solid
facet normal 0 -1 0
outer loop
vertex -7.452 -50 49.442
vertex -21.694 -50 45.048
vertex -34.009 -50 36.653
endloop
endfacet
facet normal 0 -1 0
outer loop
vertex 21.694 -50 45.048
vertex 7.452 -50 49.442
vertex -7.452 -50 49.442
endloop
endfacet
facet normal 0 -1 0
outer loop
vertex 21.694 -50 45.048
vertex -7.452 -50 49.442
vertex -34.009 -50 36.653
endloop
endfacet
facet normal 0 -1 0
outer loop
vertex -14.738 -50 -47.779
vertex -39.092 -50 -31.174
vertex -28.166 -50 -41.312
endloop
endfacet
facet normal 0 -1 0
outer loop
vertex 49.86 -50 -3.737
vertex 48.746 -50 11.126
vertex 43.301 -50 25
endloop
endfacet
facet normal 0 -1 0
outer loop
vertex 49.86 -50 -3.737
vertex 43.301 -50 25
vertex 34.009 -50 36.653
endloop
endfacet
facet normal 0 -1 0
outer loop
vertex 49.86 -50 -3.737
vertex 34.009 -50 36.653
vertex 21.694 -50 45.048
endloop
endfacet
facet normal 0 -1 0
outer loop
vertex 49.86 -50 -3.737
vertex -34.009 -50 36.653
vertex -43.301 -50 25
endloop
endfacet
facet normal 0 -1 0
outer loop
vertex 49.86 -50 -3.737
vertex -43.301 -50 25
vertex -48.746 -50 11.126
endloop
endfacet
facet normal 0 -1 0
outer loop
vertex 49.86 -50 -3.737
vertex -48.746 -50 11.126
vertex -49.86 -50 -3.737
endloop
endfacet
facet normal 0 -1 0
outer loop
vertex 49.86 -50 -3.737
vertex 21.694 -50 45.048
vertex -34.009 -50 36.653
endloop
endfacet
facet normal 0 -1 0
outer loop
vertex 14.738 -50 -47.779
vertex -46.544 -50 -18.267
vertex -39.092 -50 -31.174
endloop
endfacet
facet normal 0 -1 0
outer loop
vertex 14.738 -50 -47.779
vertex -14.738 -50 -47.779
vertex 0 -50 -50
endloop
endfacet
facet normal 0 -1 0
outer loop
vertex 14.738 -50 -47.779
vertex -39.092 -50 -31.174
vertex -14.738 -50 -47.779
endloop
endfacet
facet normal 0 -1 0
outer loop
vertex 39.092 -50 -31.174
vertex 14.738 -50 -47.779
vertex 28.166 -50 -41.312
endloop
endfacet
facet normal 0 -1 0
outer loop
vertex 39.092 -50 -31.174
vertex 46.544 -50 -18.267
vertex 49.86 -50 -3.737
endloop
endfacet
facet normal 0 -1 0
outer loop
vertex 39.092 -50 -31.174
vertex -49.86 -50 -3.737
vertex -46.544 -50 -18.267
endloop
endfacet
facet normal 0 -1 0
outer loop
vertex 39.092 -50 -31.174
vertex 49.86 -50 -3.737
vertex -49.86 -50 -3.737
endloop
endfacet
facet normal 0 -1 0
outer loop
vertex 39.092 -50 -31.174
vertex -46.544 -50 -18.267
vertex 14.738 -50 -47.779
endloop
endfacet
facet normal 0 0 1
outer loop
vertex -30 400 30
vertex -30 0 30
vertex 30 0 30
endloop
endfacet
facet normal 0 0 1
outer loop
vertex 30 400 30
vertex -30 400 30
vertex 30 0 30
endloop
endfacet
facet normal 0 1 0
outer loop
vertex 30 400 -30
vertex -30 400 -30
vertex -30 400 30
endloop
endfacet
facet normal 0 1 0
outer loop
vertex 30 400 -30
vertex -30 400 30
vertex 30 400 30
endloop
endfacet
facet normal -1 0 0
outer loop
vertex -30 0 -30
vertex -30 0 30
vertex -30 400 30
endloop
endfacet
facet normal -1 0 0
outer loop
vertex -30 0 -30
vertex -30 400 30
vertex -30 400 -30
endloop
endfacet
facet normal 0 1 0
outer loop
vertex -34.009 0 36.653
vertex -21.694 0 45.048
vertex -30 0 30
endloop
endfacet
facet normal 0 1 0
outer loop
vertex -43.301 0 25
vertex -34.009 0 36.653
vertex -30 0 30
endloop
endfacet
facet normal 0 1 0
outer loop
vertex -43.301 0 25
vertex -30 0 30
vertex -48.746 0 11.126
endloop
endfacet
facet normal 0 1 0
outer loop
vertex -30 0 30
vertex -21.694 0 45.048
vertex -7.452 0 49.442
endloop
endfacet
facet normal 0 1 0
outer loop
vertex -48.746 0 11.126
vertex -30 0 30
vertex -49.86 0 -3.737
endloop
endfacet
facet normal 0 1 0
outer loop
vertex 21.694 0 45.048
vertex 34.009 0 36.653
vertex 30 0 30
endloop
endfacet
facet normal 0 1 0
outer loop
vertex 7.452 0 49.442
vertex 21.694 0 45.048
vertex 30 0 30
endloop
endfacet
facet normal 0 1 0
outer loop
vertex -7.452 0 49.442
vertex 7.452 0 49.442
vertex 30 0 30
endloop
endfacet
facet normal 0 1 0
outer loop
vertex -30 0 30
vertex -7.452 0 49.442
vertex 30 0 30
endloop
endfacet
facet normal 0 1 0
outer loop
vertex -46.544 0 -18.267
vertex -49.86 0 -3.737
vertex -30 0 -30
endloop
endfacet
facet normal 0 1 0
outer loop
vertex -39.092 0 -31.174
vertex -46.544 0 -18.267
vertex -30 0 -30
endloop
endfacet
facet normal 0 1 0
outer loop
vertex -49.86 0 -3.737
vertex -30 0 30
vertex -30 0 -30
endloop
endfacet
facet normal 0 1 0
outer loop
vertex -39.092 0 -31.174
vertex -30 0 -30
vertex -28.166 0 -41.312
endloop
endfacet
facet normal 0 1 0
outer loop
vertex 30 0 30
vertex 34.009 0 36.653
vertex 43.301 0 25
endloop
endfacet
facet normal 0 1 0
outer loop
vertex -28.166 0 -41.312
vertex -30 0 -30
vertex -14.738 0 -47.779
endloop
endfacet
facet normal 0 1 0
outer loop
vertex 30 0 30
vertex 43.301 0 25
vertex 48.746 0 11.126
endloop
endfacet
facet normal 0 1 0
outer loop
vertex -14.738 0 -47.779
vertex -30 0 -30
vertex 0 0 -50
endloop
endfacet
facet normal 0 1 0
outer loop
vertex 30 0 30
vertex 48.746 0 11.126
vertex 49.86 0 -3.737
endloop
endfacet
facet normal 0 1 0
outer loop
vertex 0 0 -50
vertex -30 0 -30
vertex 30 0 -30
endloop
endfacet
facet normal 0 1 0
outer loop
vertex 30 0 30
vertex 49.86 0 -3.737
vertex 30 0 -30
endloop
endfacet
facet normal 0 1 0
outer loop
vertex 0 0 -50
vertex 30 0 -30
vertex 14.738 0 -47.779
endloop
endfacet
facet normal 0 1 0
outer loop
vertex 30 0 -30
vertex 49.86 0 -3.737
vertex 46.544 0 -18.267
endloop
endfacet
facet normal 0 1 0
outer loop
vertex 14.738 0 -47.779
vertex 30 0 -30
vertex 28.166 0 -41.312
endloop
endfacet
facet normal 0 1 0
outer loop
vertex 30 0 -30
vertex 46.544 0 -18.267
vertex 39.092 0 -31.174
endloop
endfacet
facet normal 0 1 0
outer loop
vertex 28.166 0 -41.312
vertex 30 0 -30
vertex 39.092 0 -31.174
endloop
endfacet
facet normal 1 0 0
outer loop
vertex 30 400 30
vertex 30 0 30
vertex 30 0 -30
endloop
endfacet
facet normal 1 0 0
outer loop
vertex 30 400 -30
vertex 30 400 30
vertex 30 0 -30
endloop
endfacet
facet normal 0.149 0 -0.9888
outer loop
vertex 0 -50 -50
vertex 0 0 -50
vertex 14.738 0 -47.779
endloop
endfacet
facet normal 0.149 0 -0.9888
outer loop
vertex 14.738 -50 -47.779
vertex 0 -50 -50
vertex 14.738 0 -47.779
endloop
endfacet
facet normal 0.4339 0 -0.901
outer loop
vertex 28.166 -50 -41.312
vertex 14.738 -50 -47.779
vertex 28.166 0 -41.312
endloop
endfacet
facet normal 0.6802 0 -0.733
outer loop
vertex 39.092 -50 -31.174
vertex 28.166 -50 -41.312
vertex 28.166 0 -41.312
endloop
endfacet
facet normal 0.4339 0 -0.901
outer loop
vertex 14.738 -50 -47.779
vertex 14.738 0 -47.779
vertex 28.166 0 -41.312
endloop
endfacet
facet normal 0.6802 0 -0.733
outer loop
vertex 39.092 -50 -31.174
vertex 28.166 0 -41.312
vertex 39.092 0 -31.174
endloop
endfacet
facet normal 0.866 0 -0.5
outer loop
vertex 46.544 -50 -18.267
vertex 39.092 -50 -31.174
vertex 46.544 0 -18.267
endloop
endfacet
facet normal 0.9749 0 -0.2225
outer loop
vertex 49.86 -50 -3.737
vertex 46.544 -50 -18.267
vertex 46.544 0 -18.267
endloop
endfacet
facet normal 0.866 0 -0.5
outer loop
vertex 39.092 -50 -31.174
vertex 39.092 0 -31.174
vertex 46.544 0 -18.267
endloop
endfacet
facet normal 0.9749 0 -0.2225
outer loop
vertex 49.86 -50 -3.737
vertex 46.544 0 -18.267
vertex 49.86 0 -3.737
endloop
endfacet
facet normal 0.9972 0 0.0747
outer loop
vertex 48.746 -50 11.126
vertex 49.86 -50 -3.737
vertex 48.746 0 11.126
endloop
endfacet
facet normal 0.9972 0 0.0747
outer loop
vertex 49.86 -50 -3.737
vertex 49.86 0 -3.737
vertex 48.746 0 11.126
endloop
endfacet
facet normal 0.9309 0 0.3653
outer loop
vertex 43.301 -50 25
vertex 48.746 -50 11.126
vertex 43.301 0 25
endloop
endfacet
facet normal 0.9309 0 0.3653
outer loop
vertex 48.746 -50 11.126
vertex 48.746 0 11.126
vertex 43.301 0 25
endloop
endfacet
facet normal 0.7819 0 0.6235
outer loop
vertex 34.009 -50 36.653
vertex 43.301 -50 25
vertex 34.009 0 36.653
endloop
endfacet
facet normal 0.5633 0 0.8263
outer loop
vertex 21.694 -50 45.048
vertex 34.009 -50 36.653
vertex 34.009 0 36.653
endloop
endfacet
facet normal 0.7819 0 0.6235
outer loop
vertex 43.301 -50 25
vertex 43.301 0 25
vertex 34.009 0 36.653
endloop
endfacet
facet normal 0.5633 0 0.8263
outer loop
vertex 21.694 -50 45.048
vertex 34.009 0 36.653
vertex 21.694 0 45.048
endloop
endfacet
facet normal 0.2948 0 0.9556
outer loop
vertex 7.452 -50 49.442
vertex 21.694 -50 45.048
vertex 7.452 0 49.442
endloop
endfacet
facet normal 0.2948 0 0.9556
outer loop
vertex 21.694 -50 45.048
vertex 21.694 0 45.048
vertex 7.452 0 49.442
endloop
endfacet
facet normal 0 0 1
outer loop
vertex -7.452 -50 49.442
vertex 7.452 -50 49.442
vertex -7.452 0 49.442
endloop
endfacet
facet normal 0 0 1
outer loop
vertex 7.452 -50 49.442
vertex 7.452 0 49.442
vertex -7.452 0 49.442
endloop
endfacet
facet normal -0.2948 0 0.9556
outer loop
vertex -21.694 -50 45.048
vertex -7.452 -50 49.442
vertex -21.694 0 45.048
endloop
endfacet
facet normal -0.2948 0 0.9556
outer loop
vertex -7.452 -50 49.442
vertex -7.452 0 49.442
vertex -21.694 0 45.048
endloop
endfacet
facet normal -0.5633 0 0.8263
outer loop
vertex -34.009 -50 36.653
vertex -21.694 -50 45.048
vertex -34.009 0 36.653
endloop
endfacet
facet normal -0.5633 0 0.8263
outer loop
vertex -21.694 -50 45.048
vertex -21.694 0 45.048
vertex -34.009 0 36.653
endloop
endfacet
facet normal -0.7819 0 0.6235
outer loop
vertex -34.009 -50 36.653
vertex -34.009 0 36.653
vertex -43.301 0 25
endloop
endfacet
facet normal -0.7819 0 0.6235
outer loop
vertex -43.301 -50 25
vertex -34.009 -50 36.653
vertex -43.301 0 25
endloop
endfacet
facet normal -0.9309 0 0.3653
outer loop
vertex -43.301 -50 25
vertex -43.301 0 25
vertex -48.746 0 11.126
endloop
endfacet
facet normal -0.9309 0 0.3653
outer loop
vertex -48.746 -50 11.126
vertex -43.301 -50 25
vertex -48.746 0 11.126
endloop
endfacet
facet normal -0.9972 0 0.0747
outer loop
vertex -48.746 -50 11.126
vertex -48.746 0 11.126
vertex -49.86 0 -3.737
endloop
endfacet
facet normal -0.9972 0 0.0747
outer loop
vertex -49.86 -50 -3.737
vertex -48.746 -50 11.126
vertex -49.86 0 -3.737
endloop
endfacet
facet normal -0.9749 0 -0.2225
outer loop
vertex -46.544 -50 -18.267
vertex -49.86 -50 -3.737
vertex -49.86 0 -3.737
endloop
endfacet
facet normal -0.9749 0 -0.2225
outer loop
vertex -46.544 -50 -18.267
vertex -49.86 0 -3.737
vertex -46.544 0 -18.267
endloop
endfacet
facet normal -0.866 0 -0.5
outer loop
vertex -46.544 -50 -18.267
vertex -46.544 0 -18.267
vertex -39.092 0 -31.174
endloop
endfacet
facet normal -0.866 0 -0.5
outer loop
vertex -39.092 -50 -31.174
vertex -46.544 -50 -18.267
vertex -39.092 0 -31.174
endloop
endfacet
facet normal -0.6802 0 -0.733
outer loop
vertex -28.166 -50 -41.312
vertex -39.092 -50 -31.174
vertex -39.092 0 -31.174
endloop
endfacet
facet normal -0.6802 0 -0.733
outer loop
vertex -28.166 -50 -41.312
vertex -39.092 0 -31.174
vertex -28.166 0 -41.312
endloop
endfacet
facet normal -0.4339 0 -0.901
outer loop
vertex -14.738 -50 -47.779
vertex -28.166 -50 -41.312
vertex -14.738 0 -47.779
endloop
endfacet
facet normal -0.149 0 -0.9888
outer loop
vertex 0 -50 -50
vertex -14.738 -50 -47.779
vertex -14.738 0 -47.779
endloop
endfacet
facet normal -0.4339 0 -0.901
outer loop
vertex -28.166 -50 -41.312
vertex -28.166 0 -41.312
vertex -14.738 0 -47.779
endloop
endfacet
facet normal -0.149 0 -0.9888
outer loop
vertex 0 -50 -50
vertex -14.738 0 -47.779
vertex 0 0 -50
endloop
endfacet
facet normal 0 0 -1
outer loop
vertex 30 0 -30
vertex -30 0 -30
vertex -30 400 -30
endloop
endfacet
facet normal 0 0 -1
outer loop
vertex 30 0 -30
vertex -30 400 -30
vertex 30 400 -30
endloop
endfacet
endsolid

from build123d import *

# Parameters (mm, degrees)
SKETCH_1_W      = 60
SKETCH_1_H      = 60
EXTRUDE_1_DEPTH = 400
SKETCH_2_R      = 50
EXTRUDE_2_DEPTH = 50


with BuildPart() as part:
    # 草图1 → 凸台-拉伸1 (new body)
    with BuildSketch(Plane(origin=(0, 0, 0), x_dir=(1, 0, 0), z_dir=(0, 1, 0))):
        Rectangle(SKETCH_1_W, SKETCH_1_H)
    extrude(amount=EXTRUDE_1_DEPTH)

    # 草图2 → 凸台-拉伸2 (add)
    with BuildSketch(Plane.XZ):
        with Locations(Location((0, 0, 0), (0, 0, 270))):
            Circle(SKETCH_2_R)
    extrude(amount=EXTRUDE_2_DEPTH)


solid = part.part
